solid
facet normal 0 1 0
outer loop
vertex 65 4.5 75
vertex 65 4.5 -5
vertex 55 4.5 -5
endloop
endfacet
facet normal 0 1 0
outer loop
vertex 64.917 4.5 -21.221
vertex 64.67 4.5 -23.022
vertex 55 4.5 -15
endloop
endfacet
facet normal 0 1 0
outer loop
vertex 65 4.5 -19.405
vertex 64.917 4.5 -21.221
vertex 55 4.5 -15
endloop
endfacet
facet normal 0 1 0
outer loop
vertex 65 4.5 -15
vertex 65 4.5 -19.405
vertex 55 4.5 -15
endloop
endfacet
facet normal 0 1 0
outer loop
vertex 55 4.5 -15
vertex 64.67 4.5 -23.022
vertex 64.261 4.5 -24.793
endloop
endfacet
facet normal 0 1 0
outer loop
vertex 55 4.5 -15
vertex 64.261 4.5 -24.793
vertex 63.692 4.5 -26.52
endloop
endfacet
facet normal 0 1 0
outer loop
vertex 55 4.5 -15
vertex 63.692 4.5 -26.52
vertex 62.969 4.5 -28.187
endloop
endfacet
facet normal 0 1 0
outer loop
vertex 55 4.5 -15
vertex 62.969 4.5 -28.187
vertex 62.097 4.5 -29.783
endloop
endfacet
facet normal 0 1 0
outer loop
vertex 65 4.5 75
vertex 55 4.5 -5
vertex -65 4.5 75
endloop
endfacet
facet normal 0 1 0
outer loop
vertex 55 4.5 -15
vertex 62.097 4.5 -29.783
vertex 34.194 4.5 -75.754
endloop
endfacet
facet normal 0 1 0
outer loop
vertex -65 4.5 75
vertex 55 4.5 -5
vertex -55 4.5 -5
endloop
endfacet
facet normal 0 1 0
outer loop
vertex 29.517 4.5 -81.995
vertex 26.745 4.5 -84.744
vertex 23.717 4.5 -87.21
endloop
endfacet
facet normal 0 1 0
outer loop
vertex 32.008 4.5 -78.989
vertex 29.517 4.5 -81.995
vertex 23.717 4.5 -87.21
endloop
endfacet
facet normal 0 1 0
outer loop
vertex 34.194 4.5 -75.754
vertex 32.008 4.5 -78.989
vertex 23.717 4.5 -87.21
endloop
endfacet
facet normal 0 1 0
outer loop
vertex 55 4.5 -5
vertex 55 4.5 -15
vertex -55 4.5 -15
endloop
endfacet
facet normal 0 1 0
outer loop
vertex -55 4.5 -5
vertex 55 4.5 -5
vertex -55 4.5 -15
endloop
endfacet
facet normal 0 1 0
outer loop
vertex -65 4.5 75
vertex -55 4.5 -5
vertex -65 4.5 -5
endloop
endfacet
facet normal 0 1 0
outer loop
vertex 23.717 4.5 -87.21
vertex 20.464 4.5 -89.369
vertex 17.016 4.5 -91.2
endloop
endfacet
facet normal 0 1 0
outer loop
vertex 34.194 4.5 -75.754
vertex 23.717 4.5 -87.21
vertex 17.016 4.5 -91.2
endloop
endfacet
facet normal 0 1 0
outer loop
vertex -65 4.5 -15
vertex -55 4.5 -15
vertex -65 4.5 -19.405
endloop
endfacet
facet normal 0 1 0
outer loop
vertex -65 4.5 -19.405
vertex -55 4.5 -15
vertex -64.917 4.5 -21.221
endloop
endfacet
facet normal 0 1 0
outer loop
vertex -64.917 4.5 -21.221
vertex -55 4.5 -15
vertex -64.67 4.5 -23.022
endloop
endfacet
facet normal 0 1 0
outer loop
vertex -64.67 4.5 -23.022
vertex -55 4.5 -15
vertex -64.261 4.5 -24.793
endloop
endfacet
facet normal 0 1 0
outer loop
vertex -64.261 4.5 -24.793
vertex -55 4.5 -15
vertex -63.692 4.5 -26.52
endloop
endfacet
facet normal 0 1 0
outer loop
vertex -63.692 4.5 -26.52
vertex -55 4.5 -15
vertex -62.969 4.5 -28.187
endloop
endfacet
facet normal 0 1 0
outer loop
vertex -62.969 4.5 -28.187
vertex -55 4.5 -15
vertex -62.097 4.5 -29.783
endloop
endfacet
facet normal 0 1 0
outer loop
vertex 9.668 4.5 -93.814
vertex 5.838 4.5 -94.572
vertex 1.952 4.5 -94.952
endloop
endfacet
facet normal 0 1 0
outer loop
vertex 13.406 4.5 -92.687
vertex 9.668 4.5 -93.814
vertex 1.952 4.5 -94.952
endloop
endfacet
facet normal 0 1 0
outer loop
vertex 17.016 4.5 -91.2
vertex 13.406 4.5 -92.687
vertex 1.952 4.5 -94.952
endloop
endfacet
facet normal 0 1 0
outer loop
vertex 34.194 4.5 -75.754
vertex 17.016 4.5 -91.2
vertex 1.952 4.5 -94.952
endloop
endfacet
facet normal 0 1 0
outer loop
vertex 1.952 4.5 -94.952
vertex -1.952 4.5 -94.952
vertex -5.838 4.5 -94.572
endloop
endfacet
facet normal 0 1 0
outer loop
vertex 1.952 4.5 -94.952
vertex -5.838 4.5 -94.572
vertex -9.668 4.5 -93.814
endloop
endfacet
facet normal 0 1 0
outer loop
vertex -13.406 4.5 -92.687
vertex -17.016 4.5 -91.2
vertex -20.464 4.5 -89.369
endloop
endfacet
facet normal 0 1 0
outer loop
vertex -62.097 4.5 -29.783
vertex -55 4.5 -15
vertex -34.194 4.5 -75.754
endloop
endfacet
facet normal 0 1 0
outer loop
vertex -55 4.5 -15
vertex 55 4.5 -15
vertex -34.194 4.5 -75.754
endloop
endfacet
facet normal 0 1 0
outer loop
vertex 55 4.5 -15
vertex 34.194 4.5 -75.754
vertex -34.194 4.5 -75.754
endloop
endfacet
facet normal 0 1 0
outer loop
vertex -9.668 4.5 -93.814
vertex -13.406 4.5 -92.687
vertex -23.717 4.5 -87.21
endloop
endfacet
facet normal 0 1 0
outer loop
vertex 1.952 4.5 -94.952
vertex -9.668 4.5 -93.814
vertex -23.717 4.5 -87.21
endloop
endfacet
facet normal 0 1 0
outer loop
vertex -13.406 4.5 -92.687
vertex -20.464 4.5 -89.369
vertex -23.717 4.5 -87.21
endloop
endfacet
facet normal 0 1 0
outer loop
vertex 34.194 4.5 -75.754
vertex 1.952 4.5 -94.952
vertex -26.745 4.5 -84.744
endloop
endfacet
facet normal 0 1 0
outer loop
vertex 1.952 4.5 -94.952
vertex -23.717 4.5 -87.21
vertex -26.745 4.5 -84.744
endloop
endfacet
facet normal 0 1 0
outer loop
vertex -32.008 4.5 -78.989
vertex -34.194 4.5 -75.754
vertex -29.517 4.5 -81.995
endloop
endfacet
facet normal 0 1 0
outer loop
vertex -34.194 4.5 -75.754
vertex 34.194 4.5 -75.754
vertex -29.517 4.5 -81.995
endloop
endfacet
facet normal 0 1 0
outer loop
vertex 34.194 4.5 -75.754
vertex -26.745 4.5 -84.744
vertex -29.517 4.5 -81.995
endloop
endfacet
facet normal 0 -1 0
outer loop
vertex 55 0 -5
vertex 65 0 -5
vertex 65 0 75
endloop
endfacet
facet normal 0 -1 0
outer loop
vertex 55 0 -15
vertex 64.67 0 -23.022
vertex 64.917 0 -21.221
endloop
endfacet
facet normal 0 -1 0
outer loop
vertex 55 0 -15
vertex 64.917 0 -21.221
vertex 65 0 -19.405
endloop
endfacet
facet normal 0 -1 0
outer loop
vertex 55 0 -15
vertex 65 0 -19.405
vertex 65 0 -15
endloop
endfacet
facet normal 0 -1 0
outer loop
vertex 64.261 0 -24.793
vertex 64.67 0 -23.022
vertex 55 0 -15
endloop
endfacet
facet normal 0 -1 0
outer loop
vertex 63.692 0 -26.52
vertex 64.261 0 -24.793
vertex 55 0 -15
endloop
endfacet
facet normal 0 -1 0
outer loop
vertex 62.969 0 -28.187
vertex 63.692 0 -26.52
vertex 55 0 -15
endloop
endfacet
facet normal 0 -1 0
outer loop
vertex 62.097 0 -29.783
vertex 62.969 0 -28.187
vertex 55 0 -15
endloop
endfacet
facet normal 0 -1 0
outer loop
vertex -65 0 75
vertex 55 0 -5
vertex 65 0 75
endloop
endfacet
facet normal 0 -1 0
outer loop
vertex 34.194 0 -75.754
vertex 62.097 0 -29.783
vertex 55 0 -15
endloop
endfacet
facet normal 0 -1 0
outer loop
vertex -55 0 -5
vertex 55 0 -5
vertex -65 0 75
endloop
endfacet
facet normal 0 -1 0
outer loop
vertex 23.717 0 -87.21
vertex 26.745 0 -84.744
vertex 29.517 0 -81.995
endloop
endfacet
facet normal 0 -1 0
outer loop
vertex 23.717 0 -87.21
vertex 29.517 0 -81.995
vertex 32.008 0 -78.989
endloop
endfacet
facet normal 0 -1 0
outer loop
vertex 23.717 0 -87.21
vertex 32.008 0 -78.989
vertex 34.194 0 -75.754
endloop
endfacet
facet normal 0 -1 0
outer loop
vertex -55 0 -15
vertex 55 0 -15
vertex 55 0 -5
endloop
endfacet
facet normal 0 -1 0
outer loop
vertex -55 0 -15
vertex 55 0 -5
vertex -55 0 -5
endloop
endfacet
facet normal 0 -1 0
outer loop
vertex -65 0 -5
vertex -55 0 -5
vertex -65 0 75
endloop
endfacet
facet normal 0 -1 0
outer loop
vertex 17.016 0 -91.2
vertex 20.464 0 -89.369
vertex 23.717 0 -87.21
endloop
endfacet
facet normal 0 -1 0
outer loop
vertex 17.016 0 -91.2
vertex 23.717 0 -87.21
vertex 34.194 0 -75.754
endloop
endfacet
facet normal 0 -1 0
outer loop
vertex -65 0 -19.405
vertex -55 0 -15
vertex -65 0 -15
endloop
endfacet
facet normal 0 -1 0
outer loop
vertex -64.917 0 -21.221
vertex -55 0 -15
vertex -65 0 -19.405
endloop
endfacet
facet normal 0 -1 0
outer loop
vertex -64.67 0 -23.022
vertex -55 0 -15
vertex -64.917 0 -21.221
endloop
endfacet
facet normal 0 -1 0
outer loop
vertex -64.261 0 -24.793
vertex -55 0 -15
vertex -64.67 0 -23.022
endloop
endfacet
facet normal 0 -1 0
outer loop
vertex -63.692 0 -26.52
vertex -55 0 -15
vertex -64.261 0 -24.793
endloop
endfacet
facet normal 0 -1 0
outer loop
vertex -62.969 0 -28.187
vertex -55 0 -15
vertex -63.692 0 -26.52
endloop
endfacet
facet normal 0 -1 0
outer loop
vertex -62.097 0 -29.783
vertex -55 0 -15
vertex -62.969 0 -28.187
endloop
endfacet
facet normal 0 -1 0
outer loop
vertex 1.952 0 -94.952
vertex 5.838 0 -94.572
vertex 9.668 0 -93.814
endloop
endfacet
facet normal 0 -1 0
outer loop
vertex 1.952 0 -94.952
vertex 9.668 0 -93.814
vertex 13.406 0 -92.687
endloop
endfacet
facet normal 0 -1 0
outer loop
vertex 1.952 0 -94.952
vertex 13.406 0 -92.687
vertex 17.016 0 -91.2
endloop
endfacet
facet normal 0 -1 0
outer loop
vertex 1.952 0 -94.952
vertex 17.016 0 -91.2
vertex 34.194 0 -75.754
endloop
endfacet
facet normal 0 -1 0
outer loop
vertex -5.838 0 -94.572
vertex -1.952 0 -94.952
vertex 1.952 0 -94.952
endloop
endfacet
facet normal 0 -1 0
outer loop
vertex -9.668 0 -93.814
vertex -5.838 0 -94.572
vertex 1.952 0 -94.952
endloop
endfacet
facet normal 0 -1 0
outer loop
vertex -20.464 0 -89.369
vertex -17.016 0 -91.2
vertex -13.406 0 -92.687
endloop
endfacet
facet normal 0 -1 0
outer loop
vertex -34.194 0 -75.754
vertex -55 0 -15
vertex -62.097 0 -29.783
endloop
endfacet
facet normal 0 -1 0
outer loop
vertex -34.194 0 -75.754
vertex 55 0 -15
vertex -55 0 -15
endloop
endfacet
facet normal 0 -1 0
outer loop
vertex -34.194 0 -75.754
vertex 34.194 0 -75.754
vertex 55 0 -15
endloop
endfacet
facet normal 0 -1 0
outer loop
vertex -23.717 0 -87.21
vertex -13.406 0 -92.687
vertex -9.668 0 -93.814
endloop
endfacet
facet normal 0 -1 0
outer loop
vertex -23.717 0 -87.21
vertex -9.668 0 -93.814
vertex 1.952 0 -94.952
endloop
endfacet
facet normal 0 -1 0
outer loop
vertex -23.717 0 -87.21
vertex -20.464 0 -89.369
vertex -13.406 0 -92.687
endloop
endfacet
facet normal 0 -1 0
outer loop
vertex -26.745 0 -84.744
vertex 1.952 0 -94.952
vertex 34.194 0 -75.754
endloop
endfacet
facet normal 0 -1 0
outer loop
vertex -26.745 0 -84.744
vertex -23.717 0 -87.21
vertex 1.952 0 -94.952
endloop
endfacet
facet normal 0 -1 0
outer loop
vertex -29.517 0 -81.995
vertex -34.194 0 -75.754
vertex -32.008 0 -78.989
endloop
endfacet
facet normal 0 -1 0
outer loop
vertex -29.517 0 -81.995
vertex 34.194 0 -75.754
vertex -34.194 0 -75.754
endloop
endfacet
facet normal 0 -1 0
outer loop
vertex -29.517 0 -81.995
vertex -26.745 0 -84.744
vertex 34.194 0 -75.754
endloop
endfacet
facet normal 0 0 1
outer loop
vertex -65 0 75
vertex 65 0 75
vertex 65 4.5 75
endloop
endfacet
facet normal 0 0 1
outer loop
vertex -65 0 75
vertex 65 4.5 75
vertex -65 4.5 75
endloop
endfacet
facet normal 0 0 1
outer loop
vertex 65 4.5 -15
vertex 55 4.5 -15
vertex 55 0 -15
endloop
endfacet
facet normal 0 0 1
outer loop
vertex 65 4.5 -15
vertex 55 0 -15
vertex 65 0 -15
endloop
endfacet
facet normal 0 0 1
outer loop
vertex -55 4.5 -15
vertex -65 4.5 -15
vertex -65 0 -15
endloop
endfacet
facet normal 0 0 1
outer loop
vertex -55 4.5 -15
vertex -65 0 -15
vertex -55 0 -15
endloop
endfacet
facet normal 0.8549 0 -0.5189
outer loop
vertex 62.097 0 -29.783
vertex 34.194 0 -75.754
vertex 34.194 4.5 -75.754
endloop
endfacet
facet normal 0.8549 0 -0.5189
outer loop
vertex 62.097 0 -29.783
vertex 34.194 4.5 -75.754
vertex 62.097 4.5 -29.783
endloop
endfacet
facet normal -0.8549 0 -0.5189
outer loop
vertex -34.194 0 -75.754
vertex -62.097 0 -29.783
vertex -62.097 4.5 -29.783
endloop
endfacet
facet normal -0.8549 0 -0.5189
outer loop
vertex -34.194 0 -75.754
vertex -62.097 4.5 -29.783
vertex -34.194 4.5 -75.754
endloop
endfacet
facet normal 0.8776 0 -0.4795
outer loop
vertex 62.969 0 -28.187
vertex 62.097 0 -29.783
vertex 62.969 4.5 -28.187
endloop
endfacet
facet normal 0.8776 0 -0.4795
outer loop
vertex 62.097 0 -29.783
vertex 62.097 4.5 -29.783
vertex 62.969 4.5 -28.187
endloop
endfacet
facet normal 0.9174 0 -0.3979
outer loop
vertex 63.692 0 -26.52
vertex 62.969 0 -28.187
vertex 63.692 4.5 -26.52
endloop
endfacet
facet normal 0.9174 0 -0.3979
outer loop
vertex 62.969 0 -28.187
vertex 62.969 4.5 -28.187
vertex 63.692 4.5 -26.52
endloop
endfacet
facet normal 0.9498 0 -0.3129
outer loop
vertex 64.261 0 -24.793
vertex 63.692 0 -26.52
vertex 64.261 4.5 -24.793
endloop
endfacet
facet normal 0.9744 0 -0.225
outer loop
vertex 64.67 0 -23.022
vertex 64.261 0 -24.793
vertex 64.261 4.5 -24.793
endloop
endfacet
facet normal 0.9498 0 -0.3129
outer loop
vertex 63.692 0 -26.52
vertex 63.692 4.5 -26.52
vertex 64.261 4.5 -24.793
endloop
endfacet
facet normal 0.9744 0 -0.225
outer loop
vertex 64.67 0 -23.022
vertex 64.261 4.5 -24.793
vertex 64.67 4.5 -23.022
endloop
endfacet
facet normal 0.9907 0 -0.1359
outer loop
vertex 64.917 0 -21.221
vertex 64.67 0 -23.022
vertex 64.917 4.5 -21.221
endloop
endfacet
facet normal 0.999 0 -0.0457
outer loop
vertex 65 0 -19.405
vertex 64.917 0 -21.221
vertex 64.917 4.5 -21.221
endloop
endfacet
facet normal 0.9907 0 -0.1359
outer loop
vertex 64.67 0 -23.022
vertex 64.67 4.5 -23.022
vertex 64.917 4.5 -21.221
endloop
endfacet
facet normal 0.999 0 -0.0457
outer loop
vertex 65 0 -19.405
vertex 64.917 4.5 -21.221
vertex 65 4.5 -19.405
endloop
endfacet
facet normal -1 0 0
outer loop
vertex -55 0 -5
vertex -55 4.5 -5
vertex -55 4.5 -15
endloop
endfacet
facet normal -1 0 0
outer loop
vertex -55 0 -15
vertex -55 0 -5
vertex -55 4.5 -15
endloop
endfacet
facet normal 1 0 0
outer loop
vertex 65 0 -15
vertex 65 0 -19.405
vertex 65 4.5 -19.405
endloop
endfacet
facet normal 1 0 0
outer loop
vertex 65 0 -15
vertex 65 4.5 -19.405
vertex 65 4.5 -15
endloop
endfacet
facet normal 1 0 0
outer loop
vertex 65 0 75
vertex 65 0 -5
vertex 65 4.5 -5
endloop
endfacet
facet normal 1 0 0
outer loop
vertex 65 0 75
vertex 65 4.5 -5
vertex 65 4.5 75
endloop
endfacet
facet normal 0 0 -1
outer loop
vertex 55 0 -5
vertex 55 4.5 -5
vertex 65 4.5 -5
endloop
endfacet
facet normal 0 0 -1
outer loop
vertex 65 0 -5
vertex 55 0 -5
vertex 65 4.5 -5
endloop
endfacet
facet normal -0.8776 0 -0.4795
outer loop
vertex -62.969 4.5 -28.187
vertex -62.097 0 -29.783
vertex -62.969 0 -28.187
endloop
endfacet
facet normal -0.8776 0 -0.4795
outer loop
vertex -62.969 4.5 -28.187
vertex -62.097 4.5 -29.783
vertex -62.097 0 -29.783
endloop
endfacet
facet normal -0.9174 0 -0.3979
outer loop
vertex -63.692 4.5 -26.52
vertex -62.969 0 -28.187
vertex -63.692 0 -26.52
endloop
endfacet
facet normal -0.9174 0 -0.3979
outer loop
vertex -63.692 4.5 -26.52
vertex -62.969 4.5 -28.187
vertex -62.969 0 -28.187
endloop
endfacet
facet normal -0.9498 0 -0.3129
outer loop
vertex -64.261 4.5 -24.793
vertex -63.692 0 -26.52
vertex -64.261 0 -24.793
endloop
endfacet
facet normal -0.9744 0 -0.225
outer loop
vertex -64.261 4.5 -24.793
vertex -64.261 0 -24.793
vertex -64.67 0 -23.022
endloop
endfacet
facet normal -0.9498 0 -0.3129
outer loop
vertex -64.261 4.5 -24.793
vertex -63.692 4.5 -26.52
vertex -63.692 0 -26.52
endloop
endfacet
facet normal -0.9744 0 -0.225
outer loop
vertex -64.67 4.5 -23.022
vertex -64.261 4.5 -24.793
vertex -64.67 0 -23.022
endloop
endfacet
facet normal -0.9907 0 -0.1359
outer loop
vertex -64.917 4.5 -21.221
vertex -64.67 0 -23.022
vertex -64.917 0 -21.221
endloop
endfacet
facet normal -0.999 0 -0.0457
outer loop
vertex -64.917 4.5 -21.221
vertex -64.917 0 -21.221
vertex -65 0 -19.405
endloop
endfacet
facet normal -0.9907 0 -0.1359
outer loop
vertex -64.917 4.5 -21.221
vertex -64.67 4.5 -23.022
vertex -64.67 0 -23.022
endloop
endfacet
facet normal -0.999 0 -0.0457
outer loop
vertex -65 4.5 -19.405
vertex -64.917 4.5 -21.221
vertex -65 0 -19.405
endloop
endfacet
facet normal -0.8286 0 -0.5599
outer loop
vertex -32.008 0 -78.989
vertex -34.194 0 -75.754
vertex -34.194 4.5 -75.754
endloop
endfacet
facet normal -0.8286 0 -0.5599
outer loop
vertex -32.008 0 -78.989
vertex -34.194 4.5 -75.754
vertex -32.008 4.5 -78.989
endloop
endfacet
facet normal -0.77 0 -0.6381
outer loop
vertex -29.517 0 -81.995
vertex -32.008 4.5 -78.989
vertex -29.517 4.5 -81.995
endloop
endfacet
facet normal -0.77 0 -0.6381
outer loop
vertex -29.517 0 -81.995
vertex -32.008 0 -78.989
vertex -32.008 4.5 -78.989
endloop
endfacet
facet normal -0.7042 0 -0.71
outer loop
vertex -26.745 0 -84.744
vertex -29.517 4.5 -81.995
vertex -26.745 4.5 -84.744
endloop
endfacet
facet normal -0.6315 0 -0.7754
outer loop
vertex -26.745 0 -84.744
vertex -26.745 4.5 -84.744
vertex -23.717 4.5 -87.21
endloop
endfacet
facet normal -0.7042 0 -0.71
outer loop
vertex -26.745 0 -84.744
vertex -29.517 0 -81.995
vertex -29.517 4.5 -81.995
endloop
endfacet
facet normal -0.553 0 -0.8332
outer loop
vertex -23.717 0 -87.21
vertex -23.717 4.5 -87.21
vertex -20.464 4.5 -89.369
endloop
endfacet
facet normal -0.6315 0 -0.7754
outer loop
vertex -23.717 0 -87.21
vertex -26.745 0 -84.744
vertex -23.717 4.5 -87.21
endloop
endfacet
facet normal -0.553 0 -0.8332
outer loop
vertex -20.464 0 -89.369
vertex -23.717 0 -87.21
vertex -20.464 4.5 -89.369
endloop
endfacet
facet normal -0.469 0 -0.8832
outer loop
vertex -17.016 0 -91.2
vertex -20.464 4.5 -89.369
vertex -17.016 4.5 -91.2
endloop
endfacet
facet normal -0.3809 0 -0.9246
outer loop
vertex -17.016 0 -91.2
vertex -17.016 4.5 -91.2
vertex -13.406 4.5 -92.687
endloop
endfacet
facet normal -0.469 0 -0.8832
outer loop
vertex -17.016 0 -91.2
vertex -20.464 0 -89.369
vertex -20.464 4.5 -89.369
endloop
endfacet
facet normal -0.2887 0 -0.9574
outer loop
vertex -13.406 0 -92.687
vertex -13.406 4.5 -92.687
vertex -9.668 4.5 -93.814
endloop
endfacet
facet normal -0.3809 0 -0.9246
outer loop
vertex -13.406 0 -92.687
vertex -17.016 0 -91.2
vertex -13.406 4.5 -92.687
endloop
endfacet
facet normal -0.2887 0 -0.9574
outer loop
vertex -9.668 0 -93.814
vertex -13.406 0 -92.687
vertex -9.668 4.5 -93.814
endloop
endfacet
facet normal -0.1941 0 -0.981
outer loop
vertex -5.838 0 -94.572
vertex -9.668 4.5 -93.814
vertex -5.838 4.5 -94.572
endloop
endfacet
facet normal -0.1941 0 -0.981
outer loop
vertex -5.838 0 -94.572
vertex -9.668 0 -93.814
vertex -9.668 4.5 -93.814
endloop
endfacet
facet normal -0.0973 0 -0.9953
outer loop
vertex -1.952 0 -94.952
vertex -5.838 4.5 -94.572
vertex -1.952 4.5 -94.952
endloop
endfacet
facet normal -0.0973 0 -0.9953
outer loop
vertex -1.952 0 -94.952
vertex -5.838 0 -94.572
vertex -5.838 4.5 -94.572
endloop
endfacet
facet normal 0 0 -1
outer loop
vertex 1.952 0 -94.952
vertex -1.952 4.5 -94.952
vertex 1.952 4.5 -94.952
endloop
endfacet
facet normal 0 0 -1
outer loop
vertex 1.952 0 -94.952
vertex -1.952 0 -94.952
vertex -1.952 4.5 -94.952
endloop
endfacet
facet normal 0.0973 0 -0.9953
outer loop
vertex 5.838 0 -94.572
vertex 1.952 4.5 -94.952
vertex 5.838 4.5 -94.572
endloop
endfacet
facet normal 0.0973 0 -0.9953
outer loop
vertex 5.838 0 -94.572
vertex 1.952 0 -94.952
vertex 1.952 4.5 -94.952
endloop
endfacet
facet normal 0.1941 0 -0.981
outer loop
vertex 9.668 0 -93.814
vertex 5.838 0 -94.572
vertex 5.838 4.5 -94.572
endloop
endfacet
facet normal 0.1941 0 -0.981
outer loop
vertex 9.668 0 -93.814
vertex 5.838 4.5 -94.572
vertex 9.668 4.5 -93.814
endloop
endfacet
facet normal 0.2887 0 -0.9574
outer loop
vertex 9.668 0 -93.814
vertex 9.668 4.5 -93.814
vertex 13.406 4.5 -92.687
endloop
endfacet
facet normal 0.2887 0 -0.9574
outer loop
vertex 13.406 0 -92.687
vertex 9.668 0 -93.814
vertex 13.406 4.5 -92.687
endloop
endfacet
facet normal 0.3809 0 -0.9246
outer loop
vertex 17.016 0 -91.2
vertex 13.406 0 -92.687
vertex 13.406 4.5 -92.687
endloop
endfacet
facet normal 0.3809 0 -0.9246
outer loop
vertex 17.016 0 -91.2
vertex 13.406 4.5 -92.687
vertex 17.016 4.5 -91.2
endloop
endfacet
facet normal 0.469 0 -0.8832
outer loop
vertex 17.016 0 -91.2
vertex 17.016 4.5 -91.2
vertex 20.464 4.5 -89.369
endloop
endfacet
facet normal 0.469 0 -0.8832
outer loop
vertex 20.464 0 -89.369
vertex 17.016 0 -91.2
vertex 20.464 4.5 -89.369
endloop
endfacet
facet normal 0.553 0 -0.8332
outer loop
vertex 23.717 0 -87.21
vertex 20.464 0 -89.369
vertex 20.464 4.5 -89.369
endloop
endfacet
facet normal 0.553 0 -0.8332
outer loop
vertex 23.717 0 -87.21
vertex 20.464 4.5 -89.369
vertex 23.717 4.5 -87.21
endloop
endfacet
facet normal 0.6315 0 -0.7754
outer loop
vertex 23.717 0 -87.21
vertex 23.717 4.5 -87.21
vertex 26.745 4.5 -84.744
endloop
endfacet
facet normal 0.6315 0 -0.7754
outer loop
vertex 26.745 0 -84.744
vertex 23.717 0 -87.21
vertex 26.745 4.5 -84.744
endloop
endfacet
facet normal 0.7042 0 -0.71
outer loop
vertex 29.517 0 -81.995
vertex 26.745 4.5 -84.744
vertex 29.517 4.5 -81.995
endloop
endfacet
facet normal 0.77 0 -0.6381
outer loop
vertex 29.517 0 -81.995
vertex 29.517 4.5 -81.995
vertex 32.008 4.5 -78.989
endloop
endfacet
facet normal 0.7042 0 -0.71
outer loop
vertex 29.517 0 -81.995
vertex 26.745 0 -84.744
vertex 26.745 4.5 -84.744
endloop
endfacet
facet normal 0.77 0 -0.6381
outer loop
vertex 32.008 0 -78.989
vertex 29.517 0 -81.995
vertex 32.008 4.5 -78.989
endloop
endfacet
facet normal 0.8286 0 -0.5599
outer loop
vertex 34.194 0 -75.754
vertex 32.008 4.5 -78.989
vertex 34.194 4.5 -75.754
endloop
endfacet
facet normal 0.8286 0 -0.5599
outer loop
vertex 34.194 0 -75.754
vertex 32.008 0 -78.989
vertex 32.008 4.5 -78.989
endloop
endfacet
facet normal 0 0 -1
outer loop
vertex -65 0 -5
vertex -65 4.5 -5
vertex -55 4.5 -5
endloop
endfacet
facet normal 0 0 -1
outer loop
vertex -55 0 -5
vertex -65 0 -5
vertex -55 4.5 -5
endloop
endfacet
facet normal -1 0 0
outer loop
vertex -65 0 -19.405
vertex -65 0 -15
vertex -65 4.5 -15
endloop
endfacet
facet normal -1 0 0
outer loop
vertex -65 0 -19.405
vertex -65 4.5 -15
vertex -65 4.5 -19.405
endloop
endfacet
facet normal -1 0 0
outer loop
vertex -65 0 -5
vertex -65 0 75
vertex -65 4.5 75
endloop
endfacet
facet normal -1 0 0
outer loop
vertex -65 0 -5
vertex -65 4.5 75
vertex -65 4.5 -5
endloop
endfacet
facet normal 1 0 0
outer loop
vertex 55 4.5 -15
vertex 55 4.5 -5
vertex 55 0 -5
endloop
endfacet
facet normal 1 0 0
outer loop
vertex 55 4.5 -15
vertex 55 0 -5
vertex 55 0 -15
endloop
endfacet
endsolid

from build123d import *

# Parameters (mm, degrees)
EXTRUDE_1_DEPTH     = 4.5
FILLET_1_R          = 20
SKETCH_2_W          = 10
SKETCH_2_H          = 10
CUT_EXTRUDE_1_DEPTH = 116.19657113


with BuildPart() as part:
    # 스케치1 → 보스-돌출1 (new body)
    with BuildSketch(Plane(origin=(0, 0, 0), x_dir=(1, 0, 0), z_dir=(0, 1, 0))):
        with BuildLine():
            Line((-65, 25), (-34.194351712, 75.754428709))
            ThreePointArc((-34.194351712, 75.754428709), (0, 95), (34.194351712, 75.754428709))
            Line((34.194351712, 75.754428709), (65, 25))
            Line((65, 25), (65, -75))
            Line((65, -75), (-65, -75))
            Line((-65, -75), (-65, 25))
        make_face()
    extrude(amount=EXTRUDE_1_DEPTH)

    # 필렛1
    fillet_1_edges = [part.edges().sort_by_distance(p)[0] for p in [
        (-65, 2.25, -25),
        (65, 2.25, -25),
    ]]
    fillet(fillet_1_edges, radius=FILLET_1_R)

    # 스케치2 → 컷-돌출1 (cut, through all)
    with BuildSketch(Plane(origin=(0, 4.5, 0), x_dir=(1, 0, 0), z_dir=(0, 1, 0))):
        with Locations((-60, 10)):
            Rectangle(SKETCH_2_W, SKETCH_2_H)
        with Locations((60, 10)):
            Rectangle(SKETCH_2_W, SKETCH_2_H)
    extrude(amount=-CUT_EXTRUDE_1_DEPTH, mode=Mode.SUBTRACT)


solid = part.part
